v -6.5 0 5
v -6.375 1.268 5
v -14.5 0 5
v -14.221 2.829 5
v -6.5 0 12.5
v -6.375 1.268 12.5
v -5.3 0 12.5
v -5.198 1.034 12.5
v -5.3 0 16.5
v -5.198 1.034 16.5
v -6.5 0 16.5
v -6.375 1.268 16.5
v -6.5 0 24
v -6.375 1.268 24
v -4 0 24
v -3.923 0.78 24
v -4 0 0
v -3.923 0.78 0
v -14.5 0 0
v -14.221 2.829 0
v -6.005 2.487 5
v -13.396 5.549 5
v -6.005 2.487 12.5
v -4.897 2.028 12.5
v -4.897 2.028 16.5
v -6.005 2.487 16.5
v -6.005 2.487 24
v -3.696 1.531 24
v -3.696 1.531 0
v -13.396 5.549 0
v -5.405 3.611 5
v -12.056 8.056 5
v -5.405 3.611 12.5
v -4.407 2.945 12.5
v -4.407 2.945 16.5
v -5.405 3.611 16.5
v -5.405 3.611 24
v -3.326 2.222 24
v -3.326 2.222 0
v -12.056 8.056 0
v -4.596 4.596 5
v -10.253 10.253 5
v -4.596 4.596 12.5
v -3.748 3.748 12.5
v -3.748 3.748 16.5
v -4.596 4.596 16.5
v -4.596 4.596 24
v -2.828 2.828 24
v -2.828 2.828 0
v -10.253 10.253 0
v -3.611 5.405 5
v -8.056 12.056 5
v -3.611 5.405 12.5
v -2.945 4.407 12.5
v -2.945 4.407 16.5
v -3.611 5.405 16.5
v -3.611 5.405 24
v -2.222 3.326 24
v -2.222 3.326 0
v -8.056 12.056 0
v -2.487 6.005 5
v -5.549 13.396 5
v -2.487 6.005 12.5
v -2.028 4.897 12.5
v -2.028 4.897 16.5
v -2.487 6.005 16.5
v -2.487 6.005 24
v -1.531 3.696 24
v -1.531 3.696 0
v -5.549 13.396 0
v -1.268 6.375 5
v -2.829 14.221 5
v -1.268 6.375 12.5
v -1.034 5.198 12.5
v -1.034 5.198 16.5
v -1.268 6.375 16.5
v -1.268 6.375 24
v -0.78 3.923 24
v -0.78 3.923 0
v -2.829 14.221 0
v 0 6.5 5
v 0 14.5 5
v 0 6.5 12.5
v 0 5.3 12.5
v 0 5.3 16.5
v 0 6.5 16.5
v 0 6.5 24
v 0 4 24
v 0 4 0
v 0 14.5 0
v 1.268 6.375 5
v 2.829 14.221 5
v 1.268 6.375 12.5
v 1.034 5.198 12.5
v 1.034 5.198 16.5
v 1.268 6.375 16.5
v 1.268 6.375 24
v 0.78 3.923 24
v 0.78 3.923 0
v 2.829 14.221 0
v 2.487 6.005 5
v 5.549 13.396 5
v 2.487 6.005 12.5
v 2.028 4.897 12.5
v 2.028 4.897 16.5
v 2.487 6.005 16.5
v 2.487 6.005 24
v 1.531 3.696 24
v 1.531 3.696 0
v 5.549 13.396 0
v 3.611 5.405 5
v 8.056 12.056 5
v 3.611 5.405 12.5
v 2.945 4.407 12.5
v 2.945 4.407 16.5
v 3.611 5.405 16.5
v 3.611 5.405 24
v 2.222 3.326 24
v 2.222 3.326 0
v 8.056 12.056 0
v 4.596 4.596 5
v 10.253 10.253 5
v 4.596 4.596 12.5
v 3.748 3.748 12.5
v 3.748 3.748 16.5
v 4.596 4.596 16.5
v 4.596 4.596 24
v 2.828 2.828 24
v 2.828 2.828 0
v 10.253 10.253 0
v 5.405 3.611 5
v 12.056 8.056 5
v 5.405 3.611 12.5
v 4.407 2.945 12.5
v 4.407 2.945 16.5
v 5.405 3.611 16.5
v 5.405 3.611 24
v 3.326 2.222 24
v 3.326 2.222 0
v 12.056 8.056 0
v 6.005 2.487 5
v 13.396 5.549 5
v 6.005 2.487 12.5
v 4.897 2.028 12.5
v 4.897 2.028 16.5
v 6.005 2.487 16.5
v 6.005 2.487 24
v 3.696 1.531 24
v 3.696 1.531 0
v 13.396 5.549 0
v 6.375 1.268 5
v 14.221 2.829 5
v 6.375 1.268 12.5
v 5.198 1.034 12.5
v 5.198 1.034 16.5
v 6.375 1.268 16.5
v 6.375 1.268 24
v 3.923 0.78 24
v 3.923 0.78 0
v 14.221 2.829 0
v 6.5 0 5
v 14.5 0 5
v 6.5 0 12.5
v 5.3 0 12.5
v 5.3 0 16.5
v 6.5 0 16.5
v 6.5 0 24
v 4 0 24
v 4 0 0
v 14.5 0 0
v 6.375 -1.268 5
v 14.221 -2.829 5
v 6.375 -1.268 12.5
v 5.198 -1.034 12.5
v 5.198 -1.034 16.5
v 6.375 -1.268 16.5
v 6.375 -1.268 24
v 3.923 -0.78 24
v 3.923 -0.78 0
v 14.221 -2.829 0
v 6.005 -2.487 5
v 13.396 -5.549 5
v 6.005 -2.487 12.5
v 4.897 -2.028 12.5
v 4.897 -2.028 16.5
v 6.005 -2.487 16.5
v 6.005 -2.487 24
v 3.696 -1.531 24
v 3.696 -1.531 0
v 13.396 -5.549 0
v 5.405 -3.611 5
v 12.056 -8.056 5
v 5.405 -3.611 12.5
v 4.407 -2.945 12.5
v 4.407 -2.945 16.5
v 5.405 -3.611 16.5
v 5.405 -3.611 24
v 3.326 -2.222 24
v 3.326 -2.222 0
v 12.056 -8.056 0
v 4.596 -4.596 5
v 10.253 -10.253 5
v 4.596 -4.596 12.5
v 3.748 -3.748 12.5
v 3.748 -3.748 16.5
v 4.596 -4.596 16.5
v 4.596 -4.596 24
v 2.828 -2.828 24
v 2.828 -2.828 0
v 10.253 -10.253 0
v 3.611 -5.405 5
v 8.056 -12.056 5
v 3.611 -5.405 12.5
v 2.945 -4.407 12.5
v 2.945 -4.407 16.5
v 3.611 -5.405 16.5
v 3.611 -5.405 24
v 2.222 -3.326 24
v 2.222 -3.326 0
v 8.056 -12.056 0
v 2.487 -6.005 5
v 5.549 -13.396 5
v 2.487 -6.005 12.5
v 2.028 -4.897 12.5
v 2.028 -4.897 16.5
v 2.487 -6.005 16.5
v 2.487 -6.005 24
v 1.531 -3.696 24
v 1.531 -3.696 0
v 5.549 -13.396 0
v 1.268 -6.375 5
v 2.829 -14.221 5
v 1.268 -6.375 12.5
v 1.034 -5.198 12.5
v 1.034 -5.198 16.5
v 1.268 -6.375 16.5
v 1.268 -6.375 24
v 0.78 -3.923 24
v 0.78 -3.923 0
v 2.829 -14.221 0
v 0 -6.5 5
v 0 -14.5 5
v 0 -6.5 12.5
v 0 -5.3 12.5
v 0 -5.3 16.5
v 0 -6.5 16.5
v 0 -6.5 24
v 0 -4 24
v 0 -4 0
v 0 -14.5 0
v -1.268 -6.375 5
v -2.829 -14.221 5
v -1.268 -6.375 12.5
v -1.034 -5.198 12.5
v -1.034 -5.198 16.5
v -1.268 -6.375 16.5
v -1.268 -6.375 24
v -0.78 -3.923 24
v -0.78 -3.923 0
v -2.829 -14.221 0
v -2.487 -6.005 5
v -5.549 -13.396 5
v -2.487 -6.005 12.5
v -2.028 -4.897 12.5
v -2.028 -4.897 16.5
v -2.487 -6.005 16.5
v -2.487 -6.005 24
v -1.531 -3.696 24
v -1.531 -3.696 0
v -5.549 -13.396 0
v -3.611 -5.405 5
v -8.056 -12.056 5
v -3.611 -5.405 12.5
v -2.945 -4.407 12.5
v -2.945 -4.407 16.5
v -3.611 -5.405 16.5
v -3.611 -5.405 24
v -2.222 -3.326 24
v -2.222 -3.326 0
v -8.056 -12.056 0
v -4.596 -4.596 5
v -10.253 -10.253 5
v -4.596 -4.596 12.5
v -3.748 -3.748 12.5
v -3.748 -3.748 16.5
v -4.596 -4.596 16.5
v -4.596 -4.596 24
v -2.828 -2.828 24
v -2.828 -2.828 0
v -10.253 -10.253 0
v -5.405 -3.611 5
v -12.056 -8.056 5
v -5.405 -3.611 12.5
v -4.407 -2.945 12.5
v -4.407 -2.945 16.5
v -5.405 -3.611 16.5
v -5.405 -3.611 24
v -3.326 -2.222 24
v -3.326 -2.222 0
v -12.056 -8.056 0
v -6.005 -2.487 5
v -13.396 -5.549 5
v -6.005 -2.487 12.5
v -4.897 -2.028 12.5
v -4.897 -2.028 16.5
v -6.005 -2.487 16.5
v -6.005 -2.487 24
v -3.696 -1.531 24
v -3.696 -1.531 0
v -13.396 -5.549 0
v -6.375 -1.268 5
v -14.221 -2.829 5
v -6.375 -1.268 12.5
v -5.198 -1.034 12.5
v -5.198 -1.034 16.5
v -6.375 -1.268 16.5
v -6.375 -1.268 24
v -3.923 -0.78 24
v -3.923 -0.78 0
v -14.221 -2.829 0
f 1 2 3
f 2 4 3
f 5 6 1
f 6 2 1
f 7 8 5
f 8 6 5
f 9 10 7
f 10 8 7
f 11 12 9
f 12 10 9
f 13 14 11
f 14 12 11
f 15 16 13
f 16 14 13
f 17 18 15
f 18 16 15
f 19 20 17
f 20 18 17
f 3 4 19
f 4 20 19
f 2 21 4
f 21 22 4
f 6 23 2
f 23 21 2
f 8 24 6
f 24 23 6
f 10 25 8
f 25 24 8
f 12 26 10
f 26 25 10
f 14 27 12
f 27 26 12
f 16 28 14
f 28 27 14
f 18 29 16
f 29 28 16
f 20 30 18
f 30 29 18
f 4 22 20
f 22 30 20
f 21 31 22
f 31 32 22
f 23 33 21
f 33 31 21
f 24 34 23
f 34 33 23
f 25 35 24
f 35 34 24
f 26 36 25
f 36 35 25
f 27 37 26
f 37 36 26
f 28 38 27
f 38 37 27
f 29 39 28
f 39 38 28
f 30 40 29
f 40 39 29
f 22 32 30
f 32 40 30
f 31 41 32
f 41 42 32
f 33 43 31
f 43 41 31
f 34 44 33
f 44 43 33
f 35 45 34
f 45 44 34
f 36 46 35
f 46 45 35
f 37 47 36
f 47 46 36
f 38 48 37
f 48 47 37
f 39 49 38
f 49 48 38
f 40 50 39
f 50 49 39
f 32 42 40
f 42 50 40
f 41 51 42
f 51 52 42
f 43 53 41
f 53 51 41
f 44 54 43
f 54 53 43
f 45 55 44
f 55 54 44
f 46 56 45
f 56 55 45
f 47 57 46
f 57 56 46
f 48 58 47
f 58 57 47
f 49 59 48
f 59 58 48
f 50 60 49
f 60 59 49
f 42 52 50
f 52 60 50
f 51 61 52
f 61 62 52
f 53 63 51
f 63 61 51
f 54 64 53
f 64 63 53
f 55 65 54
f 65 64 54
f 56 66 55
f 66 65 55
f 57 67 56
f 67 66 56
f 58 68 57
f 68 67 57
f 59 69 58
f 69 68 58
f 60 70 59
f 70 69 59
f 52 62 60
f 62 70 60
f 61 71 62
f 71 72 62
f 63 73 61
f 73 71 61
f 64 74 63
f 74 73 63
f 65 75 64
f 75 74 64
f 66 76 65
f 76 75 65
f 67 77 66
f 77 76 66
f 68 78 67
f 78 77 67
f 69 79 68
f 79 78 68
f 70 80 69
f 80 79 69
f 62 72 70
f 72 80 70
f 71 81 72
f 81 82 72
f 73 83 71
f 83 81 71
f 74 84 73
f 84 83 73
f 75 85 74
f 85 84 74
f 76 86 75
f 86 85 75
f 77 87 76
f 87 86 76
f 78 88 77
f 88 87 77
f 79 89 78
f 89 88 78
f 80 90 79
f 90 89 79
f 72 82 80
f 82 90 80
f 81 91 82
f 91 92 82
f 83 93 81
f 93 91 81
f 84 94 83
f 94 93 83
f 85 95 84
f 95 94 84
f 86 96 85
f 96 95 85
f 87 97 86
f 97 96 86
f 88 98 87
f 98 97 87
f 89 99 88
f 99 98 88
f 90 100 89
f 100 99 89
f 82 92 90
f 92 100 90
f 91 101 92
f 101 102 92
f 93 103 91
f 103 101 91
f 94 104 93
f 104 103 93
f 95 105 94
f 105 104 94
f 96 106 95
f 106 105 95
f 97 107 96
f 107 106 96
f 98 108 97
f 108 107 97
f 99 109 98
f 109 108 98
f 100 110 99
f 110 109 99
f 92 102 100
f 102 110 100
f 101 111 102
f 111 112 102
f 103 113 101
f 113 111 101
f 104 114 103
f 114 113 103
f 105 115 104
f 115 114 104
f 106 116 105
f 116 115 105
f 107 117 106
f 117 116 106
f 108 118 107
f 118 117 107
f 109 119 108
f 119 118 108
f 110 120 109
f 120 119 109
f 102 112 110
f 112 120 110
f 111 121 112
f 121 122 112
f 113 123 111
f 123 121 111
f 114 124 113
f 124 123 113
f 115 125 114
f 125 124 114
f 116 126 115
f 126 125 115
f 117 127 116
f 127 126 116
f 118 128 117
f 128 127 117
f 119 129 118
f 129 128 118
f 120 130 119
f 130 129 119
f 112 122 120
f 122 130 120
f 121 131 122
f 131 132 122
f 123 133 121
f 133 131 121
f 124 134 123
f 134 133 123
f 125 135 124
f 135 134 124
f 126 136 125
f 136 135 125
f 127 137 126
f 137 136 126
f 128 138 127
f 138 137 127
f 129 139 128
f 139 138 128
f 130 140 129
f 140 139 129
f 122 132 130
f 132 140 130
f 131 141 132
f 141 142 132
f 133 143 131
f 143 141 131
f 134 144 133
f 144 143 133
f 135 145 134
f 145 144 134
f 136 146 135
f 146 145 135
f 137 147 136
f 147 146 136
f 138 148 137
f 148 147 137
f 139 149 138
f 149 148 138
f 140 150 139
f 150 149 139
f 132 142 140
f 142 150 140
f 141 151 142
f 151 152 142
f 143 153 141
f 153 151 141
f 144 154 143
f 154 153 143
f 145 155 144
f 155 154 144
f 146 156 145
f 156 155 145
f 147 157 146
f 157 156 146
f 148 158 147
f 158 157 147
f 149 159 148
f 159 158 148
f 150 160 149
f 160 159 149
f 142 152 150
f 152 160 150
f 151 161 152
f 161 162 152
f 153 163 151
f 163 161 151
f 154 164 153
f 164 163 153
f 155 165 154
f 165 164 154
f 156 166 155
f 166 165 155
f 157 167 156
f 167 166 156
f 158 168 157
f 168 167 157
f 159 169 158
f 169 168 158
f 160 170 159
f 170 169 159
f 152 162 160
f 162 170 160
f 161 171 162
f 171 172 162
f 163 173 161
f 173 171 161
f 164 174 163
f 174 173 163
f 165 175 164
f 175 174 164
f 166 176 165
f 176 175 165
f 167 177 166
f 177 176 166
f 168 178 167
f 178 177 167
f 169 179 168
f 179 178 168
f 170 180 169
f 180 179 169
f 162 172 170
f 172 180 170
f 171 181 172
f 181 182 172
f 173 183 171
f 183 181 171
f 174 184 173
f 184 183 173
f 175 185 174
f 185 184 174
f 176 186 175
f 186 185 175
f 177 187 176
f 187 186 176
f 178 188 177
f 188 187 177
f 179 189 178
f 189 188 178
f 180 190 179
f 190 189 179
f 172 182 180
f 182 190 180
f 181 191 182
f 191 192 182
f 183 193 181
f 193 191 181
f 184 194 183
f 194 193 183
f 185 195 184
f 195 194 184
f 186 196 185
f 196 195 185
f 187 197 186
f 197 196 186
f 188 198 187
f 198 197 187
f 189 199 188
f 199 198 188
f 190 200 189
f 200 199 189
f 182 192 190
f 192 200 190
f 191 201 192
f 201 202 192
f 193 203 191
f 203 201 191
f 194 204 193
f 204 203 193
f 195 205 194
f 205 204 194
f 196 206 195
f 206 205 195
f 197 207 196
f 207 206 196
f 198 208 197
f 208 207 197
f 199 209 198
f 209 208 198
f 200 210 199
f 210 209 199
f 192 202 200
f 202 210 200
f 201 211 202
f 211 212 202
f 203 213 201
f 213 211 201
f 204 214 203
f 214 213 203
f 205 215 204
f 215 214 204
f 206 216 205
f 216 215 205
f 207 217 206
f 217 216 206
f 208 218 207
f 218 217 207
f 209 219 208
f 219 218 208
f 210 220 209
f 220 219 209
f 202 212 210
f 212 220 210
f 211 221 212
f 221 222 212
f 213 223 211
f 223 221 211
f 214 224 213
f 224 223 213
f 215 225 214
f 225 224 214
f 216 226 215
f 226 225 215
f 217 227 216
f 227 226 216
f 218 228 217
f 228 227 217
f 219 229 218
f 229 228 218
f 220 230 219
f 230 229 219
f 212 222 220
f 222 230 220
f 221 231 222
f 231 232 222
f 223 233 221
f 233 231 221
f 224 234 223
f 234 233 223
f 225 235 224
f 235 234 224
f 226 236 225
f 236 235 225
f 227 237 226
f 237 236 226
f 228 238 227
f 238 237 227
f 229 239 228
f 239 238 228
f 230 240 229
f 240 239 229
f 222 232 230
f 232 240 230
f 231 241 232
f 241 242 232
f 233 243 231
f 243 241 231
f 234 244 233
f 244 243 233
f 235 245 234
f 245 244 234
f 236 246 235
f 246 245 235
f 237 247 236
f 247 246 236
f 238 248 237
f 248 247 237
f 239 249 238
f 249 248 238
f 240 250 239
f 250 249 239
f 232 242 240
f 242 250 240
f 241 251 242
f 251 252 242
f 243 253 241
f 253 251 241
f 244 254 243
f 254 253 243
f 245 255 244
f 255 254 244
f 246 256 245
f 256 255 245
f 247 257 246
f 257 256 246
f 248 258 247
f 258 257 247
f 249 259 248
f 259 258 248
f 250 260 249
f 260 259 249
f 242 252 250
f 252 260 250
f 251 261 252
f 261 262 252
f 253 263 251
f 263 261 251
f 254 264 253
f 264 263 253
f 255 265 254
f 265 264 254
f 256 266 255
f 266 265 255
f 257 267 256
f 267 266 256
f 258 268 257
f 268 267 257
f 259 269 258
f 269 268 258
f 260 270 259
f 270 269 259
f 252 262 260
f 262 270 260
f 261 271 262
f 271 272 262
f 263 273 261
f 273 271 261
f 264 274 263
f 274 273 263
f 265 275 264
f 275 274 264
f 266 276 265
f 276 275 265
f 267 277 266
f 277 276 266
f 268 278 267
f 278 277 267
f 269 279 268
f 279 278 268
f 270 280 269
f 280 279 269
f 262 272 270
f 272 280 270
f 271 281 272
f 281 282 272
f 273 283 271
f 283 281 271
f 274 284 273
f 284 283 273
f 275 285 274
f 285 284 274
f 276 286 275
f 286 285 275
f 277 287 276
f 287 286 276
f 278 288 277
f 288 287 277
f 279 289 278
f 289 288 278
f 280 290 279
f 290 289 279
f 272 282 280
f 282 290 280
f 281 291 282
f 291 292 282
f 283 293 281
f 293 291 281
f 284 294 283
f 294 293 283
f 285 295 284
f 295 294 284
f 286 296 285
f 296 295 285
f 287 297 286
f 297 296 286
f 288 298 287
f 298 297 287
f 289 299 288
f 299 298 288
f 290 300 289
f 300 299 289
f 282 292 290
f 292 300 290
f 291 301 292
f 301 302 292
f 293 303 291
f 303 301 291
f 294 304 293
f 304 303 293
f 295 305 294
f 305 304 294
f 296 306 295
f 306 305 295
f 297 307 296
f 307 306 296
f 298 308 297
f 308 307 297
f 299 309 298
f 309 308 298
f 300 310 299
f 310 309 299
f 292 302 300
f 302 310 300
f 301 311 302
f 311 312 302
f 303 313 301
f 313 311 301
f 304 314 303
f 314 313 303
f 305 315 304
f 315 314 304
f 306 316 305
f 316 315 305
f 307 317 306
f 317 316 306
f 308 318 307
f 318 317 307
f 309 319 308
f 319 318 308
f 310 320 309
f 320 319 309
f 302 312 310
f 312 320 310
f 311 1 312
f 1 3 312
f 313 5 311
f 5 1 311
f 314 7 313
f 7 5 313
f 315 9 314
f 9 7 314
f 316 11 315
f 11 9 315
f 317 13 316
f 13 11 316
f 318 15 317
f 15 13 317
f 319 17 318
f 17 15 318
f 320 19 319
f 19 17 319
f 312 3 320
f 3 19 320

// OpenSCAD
$fn = 32;

// ----------------------------------------------------------------------
// Grooved revolve: flanged, bore R4
// ----------------------------------------------------------------------

// --- parameters (mm) ---
bore_r = 4;               // bore radius
outer_r = 6.5;            // outer radius of the body
total_h = 24;             // overall height, Z
wall = 2.5;               // radial wall thickness
groove_w = 4;             // groove width
groove_d = 1.2;           // groove depth
grooves = 1;              // number of outer grooves
flange_r = 14.5;          // flange radius
flange_h = 5;             // flange height

bbox_x = 2 * flange_r;  // full diameter
bore_d = 2 * bore_r;  // bore diameter
body_d = 2 * outer_r;  // body diameter
flange_d = 2 * flange_r;  // flange diameter
revolve_angle = 360;  // full turn around the Z axis

profile = [[4, 0], [6.5, 0], [14.5, 0], [14.5, 5], [6.5, 5], [6.5, 12.5], [5.3, 12.5], [5.3, 16.5], [6.5, 16.5], [6.5, 24], [4, 24]];  // primary outline, 11 points, counter clockwise

// --- the one profile operation ---
rotate_extrude(angle = revolve_angle) polygon(points = profile);
